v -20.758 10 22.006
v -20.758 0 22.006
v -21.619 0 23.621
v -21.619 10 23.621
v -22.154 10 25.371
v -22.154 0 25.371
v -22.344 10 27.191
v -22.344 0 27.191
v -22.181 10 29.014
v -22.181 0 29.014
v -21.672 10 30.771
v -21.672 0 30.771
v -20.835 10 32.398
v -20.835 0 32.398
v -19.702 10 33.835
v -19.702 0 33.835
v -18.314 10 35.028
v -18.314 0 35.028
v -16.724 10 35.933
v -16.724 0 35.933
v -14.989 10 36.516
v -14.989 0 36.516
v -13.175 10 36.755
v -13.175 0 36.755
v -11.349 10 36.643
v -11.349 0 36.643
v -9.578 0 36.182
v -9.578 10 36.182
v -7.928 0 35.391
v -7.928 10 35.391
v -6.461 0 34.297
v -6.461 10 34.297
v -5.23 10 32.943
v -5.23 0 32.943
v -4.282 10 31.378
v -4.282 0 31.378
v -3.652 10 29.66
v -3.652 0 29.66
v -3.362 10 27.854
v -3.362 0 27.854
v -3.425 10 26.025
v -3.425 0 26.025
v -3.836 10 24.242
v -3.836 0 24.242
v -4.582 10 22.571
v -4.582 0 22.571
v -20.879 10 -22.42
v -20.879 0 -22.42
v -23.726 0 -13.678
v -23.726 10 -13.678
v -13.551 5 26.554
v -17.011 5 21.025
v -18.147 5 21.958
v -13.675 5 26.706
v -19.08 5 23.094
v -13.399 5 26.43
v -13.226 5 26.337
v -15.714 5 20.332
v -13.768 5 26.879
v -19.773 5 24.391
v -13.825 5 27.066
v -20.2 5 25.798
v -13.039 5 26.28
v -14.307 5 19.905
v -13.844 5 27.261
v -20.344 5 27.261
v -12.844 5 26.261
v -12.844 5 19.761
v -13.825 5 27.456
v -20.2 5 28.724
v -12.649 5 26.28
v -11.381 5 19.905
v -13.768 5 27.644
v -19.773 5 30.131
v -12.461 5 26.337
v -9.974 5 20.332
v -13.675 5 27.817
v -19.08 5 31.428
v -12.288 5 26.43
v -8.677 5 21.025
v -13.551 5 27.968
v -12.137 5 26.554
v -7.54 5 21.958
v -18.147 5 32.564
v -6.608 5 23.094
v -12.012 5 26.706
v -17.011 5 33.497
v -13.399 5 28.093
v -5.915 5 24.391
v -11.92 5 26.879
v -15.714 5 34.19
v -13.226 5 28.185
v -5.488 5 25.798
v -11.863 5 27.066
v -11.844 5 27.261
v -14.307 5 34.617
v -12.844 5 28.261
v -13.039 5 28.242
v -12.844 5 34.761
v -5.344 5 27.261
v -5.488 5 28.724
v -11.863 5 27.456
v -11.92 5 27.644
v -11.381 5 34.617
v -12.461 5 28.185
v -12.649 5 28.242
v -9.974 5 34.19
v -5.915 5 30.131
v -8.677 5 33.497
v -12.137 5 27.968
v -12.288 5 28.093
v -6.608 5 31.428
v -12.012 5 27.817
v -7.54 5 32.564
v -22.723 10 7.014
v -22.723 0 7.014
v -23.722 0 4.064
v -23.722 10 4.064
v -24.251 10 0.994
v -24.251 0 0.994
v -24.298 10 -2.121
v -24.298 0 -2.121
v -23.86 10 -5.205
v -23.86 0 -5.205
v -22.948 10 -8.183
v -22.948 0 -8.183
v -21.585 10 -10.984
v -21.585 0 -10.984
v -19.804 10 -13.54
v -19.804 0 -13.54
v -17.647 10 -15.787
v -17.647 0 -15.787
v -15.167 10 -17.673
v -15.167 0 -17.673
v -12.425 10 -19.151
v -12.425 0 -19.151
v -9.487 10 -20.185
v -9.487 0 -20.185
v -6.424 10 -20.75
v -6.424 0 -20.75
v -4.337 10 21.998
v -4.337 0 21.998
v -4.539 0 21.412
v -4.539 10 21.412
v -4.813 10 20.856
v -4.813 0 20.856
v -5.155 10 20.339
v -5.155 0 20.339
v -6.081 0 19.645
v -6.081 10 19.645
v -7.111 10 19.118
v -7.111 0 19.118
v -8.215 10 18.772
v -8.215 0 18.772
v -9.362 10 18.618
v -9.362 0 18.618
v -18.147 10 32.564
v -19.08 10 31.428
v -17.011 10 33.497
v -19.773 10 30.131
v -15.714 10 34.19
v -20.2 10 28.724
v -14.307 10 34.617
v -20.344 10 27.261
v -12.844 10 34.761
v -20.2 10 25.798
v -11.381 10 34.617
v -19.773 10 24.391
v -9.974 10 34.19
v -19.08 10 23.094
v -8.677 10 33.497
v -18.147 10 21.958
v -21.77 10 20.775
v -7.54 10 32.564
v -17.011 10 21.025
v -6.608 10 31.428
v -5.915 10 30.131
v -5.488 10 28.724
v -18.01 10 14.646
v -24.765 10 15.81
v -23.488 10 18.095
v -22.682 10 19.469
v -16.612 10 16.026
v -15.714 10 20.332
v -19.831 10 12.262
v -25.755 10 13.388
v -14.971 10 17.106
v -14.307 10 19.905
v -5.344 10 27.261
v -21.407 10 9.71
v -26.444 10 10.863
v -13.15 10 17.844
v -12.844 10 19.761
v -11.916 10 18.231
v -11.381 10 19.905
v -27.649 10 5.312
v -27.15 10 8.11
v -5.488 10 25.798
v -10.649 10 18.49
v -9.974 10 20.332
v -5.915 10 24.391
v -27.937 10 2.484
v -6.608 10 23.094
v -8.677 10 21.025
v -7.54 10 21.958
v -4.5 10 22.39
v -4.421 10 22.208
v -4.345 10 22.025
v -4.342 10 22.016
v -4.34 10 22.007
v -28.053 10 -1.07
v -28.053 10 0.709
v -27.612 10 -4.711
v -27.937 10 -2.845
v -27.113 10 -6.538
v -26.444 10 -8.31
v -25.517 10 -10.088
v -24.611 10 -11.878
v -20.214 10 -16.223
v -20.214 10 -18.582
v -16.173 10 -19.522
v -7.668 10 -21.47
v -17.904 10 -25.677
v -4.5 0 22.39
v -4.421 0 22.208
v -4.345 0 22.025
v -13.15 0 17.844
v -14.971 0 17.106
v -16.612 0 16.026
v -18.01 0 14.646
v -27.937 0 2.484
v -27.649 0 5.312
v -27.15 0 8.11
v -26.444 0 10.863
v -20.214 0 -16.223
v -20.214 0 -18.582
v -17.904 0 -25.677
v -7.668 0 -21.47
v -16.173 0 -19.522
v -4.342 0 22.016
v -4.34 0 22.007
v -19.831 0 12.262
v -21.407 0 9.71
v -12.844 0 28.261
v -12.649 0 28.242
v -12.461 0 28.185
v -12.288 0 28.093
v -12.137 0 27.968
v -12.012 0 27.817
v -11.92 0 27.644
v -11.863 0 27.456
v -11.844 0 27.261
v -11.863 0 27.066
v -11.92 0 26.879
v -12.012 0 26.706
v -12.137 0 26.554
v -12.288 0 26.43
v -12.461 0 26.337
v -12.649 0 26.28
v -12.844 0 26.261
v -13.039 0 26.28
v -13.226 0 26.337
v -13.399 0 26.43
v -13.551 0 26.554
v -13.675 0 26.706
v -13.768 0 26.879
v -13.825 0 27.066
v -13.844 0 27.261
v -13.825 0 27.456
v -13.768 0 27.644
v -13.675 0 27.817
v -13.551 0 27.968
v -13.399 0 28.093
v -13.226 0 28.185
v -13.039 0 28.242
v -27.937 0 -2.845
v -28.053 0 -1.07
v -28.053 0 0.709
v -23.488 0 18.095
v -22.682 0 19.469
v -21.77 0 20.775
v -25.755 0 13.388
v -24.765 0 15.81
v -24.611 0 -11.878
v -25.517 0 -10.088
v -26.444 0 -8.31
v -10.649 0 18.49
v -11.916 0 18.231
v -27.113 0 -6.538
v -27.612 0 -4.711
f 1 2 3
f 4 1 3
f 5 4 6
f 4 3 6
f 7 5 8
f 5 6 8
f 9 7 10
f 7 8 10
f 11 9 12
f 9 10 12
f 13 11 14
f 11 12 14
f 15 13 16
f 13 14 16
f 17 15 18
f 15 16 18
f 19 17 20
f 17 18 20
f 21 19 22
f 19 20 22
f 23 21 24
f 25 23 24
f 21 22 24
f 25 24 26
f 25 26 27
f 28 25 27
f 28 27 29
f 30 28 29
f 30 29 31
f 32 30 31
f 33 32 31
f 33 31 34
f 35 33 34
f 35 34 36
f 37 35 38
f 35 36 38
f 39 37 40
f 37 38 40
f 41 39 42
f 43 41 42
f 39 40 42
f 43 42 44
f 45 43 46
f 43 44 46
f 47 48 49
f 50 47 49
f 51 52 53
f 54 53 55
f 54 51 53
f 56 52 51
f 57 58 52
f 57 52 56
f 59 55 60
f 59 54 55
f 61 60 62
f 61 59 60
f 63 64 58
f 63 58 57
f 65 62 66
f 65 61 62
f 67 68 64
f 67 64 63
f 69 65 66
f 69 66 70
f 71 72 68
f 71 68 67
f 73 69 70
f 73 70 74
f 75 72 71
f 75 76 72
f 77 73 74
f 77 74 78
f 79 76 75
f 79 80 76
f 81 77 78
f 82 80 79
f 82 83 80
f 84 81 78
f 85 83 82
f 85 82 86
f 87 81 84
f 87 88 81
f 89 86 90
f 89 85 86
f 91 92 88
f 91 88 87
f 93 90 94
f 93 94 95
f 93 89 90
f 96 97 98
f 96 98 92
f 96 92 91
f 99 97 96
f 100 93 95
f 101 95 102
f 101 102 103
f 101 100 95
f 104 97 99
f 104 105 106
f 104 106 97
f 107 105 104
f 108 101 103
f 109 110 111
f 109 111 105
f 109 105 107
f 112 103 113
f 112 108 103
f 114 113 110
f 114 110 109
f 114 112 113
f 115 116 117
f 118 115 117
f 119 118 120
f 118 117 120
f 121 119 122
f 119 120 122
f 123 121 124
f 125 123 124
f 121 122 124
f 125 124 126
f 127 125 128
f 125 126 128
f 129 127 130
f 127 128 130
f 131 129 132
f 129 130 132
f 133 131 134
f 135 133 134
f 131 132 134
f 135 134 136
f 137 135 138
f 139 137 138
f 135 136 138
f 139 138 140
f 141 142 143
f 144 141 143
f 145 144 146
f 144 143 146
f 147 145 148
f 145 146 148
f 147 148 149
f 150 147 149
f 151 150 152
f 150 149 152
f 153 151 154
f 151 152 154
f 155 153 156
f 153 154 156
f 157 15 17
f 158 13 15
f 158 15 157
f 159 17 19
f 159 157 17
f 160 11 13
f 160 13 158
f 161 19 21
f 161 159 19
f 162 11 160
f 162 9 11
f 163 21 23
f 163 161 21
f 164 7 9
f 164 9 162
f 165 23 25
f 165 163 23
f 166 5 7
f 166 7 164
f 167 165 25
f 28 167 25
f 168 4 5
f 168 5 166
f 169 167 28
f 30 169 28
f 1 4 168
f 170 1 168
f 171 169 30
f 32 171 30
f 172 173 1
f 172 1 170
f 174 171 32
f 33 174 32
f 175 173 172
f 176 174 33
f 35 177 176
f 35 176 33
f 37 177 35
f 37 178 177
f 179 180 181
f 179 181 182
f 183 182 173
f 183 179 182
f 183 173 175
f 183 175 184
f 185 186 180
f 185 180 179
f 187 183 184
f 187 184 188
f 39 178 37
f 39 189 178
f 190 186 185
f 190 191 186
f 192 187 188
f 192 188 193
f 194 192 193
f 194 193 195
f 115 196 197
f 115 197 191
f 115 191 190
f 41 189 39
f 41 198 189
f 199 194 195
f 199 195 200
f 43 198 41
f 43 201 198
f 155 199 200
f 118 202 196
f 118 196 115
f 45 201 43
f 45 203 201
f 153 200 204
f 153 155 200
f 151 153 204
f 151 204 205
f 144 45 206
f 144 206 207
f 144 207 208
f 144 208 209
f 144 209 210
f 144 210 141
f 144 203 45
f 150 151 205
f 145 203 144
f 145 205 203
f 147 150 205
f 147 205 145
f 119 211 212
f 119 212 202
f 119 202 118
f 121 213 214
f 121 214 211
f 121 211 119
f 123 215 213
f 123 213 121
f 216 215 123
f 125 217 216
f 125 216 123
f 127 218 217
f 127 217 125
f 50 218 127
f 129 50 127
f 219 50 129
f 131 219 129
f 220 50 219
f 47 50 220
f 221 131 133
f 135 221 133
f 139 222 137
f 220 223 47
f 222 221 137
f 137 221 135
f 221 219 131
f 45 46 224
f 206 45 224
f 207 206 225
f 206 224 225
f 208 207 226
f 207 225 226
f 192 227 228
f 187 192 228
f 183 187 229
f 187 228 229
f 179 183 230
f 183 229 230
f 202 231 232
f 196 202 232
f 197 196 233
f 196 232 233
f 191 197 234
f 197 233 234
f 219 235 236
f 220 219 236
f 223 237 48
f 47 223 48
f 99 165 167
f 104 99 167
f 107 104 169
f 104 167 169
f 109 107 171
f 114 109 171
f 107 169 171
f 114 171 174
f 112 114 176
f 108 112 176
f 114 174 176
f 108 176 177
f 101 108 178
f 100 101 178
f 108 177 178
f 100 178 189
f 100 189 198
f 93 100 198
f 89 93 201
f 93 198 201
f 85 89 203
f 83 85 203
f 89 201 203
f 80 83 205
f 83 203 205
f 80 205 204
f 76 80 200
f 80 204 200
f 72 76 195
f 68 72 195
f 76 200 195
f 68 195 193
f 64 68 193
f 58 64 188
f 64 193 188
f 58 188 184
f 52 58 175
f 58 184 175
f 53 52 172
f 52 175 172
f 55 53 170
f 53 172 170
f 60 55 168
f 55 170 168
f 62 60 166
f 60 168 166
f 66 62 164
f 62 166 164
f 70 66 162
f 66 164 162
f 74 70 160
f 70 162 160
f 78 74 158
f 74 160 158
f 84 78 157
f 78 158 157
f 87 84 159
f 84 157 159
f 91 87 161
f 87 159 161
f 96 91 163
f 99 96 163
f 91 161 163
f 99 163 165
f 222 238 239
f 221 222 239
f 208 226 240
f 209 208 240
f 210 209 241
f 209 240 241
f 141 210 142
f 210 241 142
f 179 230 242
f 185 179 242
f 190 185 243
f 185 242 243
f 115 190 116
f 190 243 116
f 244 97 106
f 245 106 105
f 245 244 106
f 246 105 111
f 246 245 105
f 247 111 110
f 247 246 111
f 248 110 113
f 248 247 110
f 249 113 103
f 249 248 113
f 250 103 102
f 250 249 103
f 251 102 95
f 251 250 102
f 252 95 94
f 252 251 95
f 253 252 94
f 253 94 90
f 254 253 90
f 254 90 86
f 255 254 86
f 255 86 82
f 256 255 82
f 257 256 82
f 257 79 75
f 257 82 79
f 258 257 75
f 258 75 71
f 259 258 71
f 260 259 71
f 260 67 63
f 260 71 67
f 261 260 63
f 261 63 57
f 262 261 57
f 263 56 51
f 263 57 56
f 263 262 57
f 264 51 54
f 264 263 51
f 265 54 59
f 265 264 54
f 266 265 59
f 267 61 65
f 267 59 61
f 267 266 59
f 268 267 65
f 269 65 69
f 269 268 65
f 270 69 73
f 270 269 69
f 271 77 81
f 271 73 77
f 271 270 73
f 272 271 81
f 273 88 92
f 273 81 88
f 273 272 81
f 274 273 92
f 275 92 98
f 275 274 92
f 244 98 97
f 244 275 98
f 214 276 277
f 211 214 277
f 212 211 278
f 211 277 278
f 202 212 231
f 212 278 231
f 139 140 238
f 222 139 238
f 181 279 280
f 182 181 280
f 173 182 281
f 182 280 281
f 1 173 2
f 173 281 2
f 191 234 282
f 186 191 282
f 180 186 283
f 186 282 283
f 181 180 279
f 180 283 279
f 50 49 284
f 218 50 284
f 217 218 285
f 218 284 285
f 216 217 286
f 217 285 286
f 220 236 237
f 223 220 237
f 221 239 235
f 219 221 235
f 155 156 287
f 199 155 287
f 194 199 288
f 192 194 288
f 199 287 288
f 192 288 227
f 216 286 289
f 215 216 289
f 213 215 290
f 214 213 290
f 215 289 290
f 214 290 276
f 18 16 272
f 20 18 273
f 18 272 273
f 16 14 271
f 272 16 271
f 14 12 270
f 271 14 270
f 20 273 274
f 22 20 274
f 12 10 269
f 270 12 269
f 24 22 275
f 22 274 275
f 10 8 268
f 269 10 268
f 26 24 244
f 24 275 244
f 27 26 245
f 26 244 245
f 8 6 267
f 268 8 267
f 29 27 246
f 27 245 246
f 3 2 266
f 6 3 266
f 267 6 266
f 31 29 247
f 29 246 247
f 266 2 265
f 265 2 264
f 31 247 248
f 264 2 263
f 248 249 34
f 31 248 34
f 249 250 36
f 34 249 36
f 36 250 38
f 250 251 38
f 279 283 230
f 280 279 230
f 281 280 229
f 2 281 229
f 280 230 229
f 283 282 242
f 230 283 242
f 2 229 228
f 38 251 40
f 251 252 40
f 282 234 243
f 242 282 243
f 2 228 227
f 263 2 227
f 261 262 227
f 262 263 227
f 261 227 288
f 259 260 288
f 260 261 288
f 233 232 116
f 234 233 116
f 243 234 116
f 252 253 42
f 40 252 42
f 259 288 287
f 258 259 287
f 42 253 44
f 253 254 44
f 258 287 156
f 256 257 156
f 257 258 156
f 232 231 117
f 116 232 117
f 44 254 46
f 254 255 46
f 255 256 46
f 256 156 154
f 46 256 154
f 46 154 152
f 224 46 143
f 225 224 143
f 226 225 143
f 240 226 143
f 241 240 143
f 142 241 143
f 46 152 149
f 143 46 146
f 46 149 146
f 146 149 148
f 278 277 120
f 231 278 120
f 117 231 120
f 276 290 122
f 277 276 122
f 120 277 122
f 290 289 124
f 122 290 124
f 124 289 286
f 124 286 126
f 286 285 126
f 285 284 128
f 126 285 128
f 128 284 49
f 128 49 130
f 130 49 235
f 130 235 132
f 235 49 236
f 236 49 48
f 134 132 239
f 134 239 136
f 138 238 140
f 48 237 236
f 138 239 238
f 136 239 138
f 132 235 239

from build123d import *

# Parameters (mm, degrees)
SUNGU_KIRI_R        = 1
BOSS_EXTRUDE1_DEPTH = 10
SKETCH9_R           = 7.5
CUT_EXTRUDE5_DEPTH  = 5


with BuildPart() as part:
    # sungu kiri → Boss-Extrude1 (new body)
    with BuildSketch(Plane(origin=(0, 0, 0), x_dir=(1, 0, 0), z_dir=(0, 1, 0))):
        with BuildLine():
            Line((-20.214241335, 18.58200887), (-17.903708636, 25.676772527))
            Line((-17.903708636, 25.676772527), (-20.879327355, 22.419581076))
            Line((-20.879327355, 22.419581076), (-23.726014444, 13.678492013))
            ThreePointArc((-23.726014444, 13.678492013), (-25.061399851, 10.98195956), (-26.444409257, 8.309539974))
            ThreePointArc((-26.444409257, 8.309539974), (-27.383764934, 5.63006722), (-27.936945566, 2.845115782))
            ThreePointArc((-27.936945566, 2.845115782), (-28.068014235, 0.18049064), (-27.936945566, -2.484134502))
            ThreePointArc((-27.936945566, -2.484134502), (-27.425713247, -6.715299694), (-26.444409257, -10.862727794))
            ThreePointArc((-26.444409257, -10.862727794), (-25.296755437, -14.61403578), (-23.488374839, -18.095297119))
            ThreePointArc((-23.488374839, -18.095297119), (-22.238356067, -20.131176806), (-20.758136978, -22.006357992))
            ThreePointArc((-20.758136978, -22.006357992), (-13.175246696, -36.755405871), (-4.582277955, -22.571064976))
            ThreePointArc((-4.582277955, -22.571064976), (-4.460378612, -22.299351604), (-4.344569641, -22.024987085))
            ThreePointArc((-4.344569641, -22.024987085), (-4.340995805, -22.01171692), (-4.3373846, -21.998456875))
            ThreePointArc((-4.3373846, -21.998456875), (-4.667057778, -21.129677391), (-5.155481579, -20.33916845))
            ThreePointArc((-5.155481579, -20.33916845), (-7.110923153, -19.117606911), (-9.361873626, -18.618421268))
            ThreePointArc((-9.361873626, -18.618421268), (-11.285784226, -18.376920372), (-13.150188878, -17.844238508))
            ThreePointArc((-13.150188878, -17.844238508), (-15.818147575, -16.60648921), (-18.010368345, -14.645827324))
            ThreePointArc((-18.010368345, -14.645827324), (-20.650416196, -11.005311906), (-22.72256926, -7.01414831))
            ThreePointArc((-22.72256926, -7.01414831), (-21.584958488, 10.98418111), (-6.423603233, 20.74980075))
            Line((-6.423603233, 20.74980075), (-7.667855794, 21.470443038))
            Line((-7.667855794, 21.470443038), (-16.17291449, 19.521519125))
            Line((-16.17291449, 19.521519125), (-20.214241335, 16.223172594))
            Line((-20.214241335, 16.223172594), (-20.214241335, 18.58200887))
        make_face()
        with Locations(Location((-12.843799059, -27.261189607, 0), (0, 0, 270))):
            Circle(SUNGU_KIRI_R, mode=Mode.SUBTRACT)
    extrude(amount=BOSS_EXTRUDE1_DEPTH)

    # Sketch9 → Cut-Extrude5 (cut)
    with BuildSketch(Plane(origin=(0, 10, 0), x_dir=(1, 0, 0), z_dir=(0, 1, 0))):
        with Locations(Location((-12.843799059, -27.261189607, 0), (0, 0, 270))):
            Circle(SKETCH9_R)
    extrude(amount=-CUT_EXTRUDE5_DEPTH, mode=Mode.SUBTRACT)


solid = part.part
